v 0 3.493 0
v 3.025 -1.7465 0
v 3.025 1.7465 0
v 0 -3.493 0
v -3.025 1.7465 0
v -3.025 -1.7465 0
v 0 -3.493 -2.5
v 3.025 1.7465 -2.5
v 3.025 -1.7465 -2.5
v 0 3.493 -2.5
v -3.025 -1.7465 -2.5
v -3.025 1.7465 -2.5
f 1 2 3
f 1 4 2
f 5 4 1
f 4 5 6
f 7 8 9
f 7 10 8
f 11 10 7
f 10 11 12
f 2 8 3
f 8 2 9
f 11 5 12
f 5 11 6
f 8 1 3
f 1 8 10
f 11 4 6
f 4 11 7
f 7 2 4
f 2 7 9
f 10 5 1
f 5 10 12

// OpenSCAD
// Generated by SolidPython 1.1.3 on 2022-06-04 18:09:17
$fn = 48;


difference() {
	union() {
		translate(v = [0, 0, 0]) {
			rotate(a = [0, 0, 0]) {
				translate(v = [0, 0, 0]) {
					rotate(a = [0, 0, 0]) {
						difference() {
							translate(v = [0, 0, -1.2500000000]) {
								cube(center = true, size = [12.1000000000, 12.1000000000, 2.5000000000]);
							}
							difference() {
								union() {
									translate(v = [9.0750000000, 0, 0]) {
										rotate(a = [0, 0, 0]) {
											translate(v = [0, 0, -1.2500000000]) {
												cube(center = true, size = [12.1000000000, 12.1000000000, 2.5000000000]);
											}
										}
									}
									translate(v = [-9.0750000000, 0, 0]) {
										rotate(a = [0, 0, 0]) {
											translate(v = [0, 0, -1.2500000000]) {
												cube(center = true, size = [12.1000000000, 12.1000000000, 2.5000000000]);
											}
										}
									}
								}
								union();
							}
							rotate(a = [0, 0, 60]) {
								difference() {
									union() {
										translate(v = [9.0750000000, 0, 0]) {
											rotate(a = [0, 0, 0]) {
												translate(v = [0, 0, -1.2500000000]) {
													cube(center = true, size = [12.1000000000, 12.1000000000, 2.5000000000]);
												}
											}
										}
										translate(v = [-9.0750000000, 0, 0]) {
											rotate(a = [0, 0, 0]) {
												translate(v = [0, 0, -1.2500000000]) {
													cube(center = true, size = [12.1000000000, 12.1000000000, 2.5000000000]);
												}
											}
										}
									}
									union();
								}
							}
							rotate(a = [0, 0, -60]) {
								difference() {
									union() {
										translate(v = [9.0750000000, 0, 0]) {
											rotate(a = [0, 0, 0]) {
												translate(v = [0, 0, -1.2500000000]) {
													cube(center = true, size = [12.1000000000, 12.1000000000, 2.5000000000]);
												}
											}
										}
										translate(v = [-9.0750000000, 0, 0]) {
											rotate(a = [0, 0, 0]) {
												translate(v = [0, 0, -1.2500000000]) {
													cube(center = true, size = [12.1000000000, 12.1000000000, 2.5000000000]);
												}
											}
										}
									}
									union();
								}
							}
						}
					}
				}
			}
		}
	}
	union();
}
/***********************************************
*********      SolidPython code:      **********
************************************************
 
import OPSC_dimensions as od
from solid.objects import cube, cylinder, difference, translate, union, hull, rotate, linear_extrude, square, offset, projection, intersection
from solid import scad_render_to_file


def setMode(mode="3DPR"):
    od.changeMode(mode)

def getMode():
    return od.mode

def saveToScad(fileName, parts):
    file_out = scad_render_to_file(parts, fileName, file_header=f'$fn = 48;')


def insert(item,pos=[None,None,None],x=0,y=0,z=0,ex=0,size=[None,None,None],length=0,rot=[None,None,None],rotX=0,rotY=0,rotZ=0,width=0,height=0,depth=100,rad=0,rad2=0,color="gray",alpha=1,OOwidth=0,OOheight=0,holes=True,negative=True, name=""):
    return OPSCInsert(item,pos,x,y,z,ex,size,length,rot,rotX,rotY,rotZ,width,height,depth,rad,rad2,color,alpha,OOwidth,OOheight,holes,negative,name)


def OPSCInsert(item,pos=[None,None,None],x=0,y=0,z=0,ex=0,size=[None,None,None],length=0,rot=[None,None,None],rotX=0,rotY=0,rotZ=0,width=0,height=0,depth=100,rad=0,rad2=0,color="gray",alpha=1,OOwidth=0,OOheight=0,holes=True,negative=True, name=""):
    
    """
        color(color,alpha){
            translate([x,y,z]){
                    rotate([rotX,rotY,rotZ]){
    """
    returnValue = ""

    print(pos)

    if pos[0] != None:
        x=pos[0]
        y=pos[1]
        z=pos[2]
    if rot[0] != None:
        rotX=rot[0]
        rotY=rot[1]
        rotZ=rot[2]
    
    returnValue = translate((x,y,z))(
            rotate((rotX,rotY,rotZ))(
                OPSCInsertIf(item,pos,x,y,z,ex,size,length,rot,rotX,rotY,rotZ,width,height,depth,rad,rad2,color,alpha,OOwidth,OOheight,holes,negative,name)
            )
        )
    

    return returnValue

def OPSCInsertIf(item,pos=[None,None,None],x=0,y=0,z=0,ex=0,size=[None,None,None],length=0,rot=[None,None,None],rotX=0,rotY=0,rotZ=0,width=0,height=0,depth=100,rad=0,rad2=0,color="gray",alpha=1,OOwidth=0,OOheight=0,holes=True,negative=True, name=""):
    returnValue = cube([10,10,10])

    if size[0] != None:
        width=size[0]
        height=size[1]
        depth=size[2]

    print("    OPSCInsert item:" + str(item) + " at:[" + str(x) + "," + str(y) + "," + str(z) + "] size: [" + str(width) + "," + str(height) + "," + str(depth) + "]")

    if(item=="cube"):
        returnValue =  translate([0,0,-depth/2])(cube([width,height,depth],center=True))
    elif(item=="cylinder"):        
        returnValue = translate([0,0,-depth/2])(cylinder(r=rad,h=depth,center=True))
    elif(item=="plane"):
        returnValue = insert("cube",size=[1000,1000,0.1],color=color)    
    elif(item=="cubeRounded"):
        if(rad == 0):
                            rad = 5
        returnValue =  translate([0,0,-depth])(
                        linear_extrude(height=depth)(                        
                            offset(r=rad)(
                                square((width-rad*2+.01,height-rad*2+.01),center=True)
                                )
                            )
        )

    ######  Holes    
    elif(item == "holeM1"):
        returnValue = OSPCgetHole(rad=1)
    elif(item == "holeM2"):
        returnValue = OSPCgetHole(rad=2)
    elif(item == "holeM3"):
        returnValue = OSPCgetHole(rad=3)
    elif(item == "holeM4"):
        returnValue = OSPCgetHole(rad=4)
    elif(item == "holeM5"):
        returnValue = OSPCgetHole(rad=5)
    elif(item == "holeM6"):
        returnValue = OSPCgetHole(rad=6)
    elif(item == "hole"):
        returnValue = OSPCgetHole(rad=rad)

    ######  Nuts
    elif(item == "nutM1"):
        returnValue = OSPCgetNut(rad=1,depth=depth)
    elif(item == "nutM2"):
        returnValue = OSPCgetNut(rad=2,depth=depth)
    elif(item == "nutM3"):
        returnValue = OSPCgetNut(rad=3,depth=depth)
    elif(item == "nutM4"):
        returnValue = OSPCgetNut(rad=4,depth=depth)
    elif(item == "nutM5"):
        returnValue = OSPCgetNut(rad=5,depth=depth)
    elif(item == "nutM6"):
        returnValue = OSPCgetNut(rad=6,depth=depth)
    elif(item == "nut"):
        returnValue = OSPCgetNut(rad=rad,depth=depth)
    return returnValue

                

def OSPCgetHole(rad):
    return translate([0,0,-250])(cylinder(r=od.holeM[rad-1],h=500))

def OSPCgetNut(rad,depth):
    print(depth)
    print(od.nutM)
    depth = od.nutM[rad-1][od.NUTDEPTH] if depth==100 else depth
    returnValue = OPSChexagon(od.nutM[rad-1][od.NUTWIDTH],depth=depth)
    return returnValue

def OPSChexagon(width,depth):
    cutter = item()
    wid=width*2
    cutter.addPos(insert("cube",pos=[wid/2+width/2,0,0],size=[wid,wid,depth]))
    cutter.addPos(insert("cube",pos=[-wid/2-width/2,0,0],size=[wid,wid,depth]))

    cut = cutter.getPart()
    print(depth)
    returnValue = difference()(
        translate([0,0,-depth/2])(cube([wid,wid,depth],center=True)),
        cut,
        rotate([0,0,60])(cut),
        rotate([0,0,-60])(cut)
    )

    return returnValue




class item:

    def __init__(self):
        self.posItems=list()
        self.negItems=list()


    def addPos(self,part):
        self.posItems.append(part)
    def addNeg(self,part):
        self.negItems.append(part)

    def getPart(self):
        returnValue = difference()(
            union()(self.posItems),
            union()(self.negItems)
        )
        return returnValue

    def getLaser(self,start=0,layers=1,thickness=-3,tileDif=200):
        rv= []

        for x in range(layers):
            rv.append(translate([0,x*tileDif,0])(
                    projection()(
                        intersection()(
                            insert("plane",z=start+x*thickness),
                            self.getPart()
                        )
                    )
            )
            )
        return union()(rv)
 
 
************************************************/
